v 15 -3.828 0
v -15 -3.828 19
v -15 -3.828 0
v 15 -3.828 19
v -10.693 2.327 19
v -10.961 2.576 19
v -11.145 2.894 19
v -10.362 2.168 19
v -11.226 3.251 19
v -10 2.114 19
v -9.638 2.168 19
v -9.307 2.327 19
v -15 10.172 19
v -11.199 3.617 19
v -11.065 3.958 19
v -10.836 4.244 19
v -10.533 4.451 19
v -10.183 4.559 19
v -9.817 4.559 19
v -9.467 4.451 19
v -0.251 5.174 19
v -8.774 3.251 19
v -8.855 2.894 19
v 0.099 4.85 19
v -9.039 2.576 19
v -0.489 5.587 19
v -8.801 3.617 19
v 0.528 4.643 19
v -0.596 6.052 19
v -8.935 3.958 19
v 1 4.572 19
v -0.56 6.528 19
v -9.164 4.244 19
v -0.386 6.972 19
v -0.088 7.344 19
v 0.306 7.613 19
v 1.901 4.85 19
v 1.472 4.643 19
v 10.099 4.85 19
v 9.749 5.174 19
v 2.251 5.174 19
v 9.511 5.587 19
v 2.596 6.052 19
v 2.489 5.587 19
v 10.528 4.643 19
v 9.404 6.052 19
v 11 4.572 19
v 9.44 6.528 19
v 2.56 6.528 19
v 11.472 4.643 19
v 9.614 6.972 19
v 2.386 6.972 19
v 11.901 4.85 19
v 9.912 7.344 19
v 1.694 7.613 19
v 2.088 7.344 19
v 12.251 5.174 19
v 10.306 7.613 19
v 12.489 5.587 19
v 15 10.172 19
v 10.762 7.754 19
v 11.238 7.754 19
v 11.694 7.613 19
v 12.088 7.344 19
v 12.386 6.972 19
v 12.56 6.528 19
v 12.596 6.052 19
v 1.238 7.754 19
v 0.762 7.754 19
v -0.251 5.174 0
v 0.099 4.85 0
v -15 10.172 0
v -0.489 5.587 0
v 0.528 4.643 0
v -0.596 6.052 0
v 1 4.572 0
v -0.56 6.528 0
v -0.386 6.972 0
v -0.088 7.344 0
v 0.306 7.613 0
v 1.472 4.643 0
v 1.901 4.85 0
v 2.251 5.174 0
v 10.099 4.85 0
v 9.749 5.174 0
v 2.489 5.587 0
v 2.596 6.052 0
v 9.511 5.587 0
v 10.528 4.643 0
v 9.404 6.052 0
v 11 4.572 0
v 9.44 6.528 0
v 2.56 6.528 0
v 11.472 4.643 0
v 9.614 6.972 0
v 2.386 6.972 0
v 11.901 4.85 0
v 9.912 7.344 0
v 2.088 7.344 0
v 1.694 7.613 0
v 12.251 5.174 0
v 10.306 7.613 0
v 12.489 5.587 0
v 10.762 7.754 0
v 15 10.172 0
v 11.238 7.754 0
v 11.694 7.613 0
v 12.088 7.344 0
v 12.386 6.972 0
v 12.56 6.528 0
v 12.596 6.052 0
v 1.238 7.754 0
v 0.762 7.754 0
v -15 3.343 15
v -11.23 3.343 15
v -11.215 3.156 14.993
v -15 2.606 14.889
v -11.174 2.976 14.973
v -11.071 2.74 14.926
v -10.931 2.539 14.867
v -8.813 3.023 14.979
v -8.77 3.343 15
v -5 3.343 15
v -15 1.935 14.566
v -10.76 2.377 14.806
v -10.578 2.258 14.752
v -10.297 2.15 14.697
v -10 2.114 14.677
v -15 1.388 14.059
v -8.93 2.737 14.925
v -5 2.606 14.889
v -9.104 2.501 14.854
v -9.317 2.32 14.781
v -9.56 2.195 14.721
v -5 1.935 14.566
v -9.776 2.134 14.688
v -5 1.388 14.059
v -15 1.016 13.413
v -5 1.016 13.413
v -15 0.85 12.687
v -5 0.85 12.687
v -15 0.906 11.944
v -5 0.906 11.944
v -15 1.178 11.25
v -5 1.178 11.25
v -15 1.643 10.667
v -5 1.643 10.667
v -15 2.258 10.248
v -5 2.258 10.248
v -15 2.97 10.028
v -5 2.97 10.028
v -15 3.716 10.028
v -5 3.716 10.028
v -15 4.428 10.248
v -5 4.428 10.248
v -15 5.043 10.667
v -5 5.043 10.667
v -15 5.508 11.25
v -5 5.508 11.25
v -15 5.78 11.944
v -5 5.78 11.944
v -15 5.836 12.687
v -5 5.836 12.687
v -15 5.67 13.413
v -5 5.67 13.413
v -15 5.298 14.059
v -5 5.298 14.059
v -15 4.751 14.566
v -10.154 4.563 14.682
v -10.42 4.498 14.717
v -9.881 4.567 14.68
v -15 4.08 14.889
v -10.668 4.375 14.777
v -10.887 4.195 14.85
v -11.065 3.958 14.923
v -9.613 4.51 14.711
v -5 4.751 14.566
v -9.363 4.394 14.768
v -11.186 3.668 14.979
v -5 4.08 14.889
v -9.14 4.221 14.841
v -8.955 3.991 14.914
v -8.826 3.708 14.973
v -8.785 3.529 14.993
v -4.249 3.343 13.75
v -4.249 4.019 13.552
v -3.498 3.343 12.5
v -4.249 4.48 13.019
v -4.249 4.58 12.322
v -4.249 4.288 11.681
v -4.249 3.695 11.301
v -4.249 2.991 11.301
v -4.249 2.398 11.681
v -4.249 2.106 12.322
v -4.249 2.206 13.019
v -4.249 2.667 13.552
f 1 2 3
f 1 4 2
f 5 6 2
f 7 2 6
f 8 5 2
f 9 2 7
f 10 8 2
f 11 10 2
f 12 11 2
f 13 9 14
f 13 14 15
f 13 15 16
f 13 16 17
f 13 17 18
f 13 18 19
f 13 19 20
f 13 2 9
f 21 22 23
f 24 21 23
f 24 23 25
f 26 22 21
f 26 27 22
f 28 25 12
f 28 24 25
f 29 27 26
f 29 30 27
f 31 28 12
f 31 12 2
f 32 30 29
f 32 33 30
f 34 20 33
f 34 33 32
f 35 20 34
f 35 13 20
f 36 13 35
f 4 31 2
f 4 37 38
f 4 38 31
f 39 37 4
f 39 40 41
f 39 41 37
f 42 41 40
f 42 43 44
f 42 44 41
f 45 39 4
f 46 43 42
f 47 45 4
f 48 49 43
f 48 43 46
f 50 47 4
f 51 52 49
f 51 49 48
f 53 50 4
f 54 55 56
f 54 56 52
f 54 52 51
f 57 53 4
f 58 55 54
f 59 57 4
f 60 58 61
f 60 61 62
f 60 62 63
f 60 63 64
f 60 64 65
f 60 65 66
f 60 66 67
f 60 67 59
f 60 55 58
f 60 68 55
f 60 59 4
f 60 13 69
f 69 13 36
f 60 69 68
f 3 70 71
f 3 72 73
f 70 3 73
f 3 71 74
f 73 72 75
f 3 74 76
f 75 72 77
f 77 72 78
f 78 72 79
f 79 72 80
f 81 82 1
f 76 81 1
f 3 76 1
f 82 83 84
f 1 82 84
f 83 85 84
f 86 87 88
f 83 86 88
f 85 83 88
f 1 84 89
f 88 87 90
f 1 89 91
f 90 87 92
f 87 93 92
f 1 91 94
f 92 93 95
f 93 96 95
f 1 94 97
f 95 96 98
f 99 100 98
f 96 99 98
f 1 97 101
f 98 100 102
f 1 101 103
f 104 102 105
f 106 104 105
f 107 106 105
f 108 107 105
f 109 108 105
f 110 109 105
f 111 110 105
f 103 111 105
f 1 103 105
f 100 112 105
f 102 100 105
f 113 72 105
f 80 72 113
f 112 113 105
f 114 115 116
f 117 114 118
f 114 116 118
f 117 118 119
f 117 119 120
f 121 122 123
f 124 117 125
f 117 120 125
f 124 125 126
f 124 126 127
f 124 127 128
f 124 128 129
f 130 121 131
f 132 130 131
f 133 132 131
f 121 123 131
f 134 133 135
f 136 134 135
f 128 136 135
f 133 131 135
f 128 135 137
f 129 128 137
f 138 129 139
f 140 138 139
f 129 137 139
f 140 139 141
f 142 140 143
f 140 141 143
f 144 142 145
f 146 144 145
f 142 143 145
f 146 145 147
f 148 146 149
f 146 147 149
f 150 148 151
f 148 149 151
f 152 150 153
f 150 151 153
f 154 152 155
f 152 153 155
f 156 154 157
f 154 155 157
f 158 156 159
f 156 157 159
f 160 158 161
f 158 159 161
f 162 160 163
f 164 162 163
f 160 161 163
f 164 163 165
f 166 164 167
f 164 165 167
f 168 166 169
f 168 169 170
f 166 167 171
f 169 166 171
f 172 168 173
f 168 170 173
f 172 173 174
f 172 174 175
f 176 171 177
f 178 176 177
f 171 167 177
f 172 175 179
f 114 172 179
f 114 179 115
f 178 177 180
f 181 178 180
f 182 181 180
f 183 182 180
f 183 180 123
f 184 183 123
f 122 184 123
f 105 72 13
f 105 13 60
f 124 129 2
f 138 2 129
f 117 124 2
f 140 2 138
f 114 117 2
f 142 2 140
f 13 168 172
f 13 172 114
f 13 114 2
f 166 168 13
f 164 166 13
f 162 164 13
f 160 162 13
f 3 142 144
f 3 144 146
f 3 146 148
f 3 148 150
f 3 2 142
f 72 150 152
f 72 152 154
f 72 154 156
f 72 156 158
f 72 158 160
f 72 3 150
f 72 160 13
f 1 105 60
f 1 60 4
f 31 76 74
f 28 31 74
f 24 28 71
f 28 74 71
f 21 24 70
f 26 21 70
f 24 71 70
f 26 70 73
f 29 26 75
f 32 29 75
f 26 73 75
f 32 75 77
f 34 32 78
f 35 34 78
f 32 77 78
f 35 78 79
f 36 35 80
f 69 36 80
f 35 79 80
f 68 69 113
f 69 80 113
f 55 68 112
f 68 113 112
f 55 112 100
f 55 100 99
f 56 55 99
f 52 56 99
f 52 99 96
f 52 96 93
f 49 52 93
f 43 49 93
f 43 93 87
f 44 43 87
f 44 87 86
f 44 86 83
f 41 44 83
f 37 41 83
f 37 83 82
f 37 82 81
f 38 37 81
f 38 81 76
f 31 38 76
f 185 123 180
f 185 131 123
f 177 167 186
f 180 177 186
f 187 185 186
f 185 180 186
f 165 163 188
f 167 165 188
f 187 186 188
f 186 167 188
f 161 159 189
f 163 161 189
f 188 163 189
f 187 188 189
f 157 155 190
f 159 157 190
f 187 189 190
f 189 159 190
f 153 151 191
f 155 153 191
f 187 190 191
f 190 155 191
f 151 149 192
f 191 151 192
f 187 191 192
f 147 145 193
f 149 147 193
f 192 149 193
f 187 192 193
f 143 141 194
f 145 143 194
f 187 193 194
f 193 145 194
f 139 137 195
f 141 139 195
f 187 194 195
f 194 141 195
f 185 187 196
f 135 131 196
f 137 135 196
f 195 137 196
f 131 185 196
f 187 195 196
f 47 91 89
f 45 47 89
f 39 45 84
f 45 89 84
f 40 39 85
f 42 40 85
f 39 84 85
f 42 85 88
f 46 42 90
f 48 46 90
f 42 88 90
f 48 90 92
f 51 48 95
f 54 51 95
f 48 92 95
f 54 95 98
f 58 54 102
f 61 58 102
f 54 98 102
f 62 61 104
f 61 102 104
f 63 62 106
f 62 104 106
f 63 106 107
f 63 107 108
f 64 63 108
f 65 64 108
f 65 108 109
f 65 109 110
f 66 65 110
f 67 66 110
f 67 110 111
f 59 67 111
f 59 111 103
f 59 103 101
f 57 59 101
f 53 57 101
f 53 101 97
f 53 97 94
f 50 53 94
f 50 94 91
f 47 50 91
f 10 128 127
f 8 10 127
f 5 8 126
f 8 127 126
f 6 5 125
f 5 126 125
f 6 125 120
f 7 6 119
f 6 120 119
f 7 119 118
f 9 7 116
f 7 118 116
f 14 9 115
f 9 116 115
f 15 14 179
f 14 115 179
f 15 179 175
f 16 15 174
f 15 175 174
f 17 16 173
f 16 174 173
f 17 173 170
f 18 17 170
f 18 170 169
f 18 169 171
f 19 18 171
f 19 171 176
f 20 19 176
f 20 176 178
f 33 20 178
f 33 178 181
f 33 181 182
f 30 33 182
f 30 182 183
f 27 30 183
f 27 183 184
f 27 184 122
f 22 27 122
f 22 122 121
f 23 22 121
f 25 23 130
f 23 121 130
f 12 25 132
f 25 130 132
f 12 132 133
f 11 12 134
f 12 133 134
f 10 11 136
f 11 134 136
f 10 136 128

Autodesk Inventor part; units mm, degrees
ref_plane "YZ Plane" through (0, 0, 0) normal (1, 0, 0) x (0, 1, 0)
ref_plane "XZ Plane" through (0, 0, 0) normal (0, 1, 0) x (-1, 0, 0)
ref_plane "XY Plane" through (0, 0, 0) normal (0, 0, 1) x (1, 0, 0)
sketch "Sketch1" plane through (0, 0, 0) normal (0, 0, 1) x (1, 0, 0)
  line L0 (-15, 10.1715) -> (15, 10.1715)
  line L1 (15, 10.1715) -> (15, -10.1715)
  line L2 (15, -10.1715) -> (-15, -10.1715)
  line L3 (-15, -10.1715) -> (-15, 10.1715)
  line L4 (0, 0) -> (0, 4.8999) construction
  line L5 (0, 0) -> (4.2328, 0) construction
  dimension "d2" = 20.343
  dimension "d3" = 30
extrude "Extrusion1" add sketch "Sketch1" along normal blind 19
sketch "Sketch2" plane through (15, -10.1715, 0) normal (1, 0, 0) x (0, 0, -1)
  line L0 (0, 0) -> (-19, 0) projected
  line L1 (0, 0) -> (-30, 0)
  line L2 (-30, 0) -> (-30, 6.343)
  line L3 (-30, 6.343) -> (0, 6.343)
  line L4 (0, 6.343) -> (0, 0)
  point P0 (0, 10.1715)
  dimension "d4" = 30
  dimension "d5" = 6.343
extrude "Extrusion2" cut sketch "Sketch2" against normal up to next
sketch "Sketch3" plane through (0, 0, 19) normal (0, 0, 1) x (1, 0, 0)
  line L0 (15, 10.1715) -> (-15, 10.1715) projected
  line L1 (-15, 10.1715) -> (-15, -10.1715) projected
  line L2 (15, -10.1715) -> (15, 10.1715) projected
  point P0 (0, 0)
  point P1 (1, 6.1715)
  point P2 (11, 6.1715)
  dimension "d8" = 4
  dimension "d9" = 4
  dimension "d17" = 16
  dimension "d18" = 4
hole "Hole1" at (1, 6.1715, 19) at (11, 6.1715, 19) direction (0, 0, -1) diameter 3.2 end through all
sketch "Sketch4" plane through (-15, -10.1715, 19) normal (-1, 0, 0) x (0, 0, 1)
  circle A0 centre (-6.5, 13.5145) radius 2.5 projected
  point P0 (-19, 10.1715)
hole "Hole2" at (-15, 3.343, 12.5) direction (1, 0, 0) diameter 5 depth 10 tip angle 118
sketch "Sketch6" plane through (0, 0, 19) normal (0, 0, 1) x (1, 0, 0)
  line L0 (-15, 0.843) -> (-15, 5.843) projected
  point P0 (0, 0)
  point P1 (-10, 3.343)
  point P2 (-15, 3.343)
  dimension "d26" = 5
hole "Hole3" at (-10, 3.343, 19) direction (0, 0, -1) diameter 2.459 depth 6.05 tip angle 118 thread size "M3x0.5" class "6H" standard "ISO Metric profile"
properties part number "3d_LM-Welding_Tooling -  Moving Block" material "Aluminium 6061-T6"
